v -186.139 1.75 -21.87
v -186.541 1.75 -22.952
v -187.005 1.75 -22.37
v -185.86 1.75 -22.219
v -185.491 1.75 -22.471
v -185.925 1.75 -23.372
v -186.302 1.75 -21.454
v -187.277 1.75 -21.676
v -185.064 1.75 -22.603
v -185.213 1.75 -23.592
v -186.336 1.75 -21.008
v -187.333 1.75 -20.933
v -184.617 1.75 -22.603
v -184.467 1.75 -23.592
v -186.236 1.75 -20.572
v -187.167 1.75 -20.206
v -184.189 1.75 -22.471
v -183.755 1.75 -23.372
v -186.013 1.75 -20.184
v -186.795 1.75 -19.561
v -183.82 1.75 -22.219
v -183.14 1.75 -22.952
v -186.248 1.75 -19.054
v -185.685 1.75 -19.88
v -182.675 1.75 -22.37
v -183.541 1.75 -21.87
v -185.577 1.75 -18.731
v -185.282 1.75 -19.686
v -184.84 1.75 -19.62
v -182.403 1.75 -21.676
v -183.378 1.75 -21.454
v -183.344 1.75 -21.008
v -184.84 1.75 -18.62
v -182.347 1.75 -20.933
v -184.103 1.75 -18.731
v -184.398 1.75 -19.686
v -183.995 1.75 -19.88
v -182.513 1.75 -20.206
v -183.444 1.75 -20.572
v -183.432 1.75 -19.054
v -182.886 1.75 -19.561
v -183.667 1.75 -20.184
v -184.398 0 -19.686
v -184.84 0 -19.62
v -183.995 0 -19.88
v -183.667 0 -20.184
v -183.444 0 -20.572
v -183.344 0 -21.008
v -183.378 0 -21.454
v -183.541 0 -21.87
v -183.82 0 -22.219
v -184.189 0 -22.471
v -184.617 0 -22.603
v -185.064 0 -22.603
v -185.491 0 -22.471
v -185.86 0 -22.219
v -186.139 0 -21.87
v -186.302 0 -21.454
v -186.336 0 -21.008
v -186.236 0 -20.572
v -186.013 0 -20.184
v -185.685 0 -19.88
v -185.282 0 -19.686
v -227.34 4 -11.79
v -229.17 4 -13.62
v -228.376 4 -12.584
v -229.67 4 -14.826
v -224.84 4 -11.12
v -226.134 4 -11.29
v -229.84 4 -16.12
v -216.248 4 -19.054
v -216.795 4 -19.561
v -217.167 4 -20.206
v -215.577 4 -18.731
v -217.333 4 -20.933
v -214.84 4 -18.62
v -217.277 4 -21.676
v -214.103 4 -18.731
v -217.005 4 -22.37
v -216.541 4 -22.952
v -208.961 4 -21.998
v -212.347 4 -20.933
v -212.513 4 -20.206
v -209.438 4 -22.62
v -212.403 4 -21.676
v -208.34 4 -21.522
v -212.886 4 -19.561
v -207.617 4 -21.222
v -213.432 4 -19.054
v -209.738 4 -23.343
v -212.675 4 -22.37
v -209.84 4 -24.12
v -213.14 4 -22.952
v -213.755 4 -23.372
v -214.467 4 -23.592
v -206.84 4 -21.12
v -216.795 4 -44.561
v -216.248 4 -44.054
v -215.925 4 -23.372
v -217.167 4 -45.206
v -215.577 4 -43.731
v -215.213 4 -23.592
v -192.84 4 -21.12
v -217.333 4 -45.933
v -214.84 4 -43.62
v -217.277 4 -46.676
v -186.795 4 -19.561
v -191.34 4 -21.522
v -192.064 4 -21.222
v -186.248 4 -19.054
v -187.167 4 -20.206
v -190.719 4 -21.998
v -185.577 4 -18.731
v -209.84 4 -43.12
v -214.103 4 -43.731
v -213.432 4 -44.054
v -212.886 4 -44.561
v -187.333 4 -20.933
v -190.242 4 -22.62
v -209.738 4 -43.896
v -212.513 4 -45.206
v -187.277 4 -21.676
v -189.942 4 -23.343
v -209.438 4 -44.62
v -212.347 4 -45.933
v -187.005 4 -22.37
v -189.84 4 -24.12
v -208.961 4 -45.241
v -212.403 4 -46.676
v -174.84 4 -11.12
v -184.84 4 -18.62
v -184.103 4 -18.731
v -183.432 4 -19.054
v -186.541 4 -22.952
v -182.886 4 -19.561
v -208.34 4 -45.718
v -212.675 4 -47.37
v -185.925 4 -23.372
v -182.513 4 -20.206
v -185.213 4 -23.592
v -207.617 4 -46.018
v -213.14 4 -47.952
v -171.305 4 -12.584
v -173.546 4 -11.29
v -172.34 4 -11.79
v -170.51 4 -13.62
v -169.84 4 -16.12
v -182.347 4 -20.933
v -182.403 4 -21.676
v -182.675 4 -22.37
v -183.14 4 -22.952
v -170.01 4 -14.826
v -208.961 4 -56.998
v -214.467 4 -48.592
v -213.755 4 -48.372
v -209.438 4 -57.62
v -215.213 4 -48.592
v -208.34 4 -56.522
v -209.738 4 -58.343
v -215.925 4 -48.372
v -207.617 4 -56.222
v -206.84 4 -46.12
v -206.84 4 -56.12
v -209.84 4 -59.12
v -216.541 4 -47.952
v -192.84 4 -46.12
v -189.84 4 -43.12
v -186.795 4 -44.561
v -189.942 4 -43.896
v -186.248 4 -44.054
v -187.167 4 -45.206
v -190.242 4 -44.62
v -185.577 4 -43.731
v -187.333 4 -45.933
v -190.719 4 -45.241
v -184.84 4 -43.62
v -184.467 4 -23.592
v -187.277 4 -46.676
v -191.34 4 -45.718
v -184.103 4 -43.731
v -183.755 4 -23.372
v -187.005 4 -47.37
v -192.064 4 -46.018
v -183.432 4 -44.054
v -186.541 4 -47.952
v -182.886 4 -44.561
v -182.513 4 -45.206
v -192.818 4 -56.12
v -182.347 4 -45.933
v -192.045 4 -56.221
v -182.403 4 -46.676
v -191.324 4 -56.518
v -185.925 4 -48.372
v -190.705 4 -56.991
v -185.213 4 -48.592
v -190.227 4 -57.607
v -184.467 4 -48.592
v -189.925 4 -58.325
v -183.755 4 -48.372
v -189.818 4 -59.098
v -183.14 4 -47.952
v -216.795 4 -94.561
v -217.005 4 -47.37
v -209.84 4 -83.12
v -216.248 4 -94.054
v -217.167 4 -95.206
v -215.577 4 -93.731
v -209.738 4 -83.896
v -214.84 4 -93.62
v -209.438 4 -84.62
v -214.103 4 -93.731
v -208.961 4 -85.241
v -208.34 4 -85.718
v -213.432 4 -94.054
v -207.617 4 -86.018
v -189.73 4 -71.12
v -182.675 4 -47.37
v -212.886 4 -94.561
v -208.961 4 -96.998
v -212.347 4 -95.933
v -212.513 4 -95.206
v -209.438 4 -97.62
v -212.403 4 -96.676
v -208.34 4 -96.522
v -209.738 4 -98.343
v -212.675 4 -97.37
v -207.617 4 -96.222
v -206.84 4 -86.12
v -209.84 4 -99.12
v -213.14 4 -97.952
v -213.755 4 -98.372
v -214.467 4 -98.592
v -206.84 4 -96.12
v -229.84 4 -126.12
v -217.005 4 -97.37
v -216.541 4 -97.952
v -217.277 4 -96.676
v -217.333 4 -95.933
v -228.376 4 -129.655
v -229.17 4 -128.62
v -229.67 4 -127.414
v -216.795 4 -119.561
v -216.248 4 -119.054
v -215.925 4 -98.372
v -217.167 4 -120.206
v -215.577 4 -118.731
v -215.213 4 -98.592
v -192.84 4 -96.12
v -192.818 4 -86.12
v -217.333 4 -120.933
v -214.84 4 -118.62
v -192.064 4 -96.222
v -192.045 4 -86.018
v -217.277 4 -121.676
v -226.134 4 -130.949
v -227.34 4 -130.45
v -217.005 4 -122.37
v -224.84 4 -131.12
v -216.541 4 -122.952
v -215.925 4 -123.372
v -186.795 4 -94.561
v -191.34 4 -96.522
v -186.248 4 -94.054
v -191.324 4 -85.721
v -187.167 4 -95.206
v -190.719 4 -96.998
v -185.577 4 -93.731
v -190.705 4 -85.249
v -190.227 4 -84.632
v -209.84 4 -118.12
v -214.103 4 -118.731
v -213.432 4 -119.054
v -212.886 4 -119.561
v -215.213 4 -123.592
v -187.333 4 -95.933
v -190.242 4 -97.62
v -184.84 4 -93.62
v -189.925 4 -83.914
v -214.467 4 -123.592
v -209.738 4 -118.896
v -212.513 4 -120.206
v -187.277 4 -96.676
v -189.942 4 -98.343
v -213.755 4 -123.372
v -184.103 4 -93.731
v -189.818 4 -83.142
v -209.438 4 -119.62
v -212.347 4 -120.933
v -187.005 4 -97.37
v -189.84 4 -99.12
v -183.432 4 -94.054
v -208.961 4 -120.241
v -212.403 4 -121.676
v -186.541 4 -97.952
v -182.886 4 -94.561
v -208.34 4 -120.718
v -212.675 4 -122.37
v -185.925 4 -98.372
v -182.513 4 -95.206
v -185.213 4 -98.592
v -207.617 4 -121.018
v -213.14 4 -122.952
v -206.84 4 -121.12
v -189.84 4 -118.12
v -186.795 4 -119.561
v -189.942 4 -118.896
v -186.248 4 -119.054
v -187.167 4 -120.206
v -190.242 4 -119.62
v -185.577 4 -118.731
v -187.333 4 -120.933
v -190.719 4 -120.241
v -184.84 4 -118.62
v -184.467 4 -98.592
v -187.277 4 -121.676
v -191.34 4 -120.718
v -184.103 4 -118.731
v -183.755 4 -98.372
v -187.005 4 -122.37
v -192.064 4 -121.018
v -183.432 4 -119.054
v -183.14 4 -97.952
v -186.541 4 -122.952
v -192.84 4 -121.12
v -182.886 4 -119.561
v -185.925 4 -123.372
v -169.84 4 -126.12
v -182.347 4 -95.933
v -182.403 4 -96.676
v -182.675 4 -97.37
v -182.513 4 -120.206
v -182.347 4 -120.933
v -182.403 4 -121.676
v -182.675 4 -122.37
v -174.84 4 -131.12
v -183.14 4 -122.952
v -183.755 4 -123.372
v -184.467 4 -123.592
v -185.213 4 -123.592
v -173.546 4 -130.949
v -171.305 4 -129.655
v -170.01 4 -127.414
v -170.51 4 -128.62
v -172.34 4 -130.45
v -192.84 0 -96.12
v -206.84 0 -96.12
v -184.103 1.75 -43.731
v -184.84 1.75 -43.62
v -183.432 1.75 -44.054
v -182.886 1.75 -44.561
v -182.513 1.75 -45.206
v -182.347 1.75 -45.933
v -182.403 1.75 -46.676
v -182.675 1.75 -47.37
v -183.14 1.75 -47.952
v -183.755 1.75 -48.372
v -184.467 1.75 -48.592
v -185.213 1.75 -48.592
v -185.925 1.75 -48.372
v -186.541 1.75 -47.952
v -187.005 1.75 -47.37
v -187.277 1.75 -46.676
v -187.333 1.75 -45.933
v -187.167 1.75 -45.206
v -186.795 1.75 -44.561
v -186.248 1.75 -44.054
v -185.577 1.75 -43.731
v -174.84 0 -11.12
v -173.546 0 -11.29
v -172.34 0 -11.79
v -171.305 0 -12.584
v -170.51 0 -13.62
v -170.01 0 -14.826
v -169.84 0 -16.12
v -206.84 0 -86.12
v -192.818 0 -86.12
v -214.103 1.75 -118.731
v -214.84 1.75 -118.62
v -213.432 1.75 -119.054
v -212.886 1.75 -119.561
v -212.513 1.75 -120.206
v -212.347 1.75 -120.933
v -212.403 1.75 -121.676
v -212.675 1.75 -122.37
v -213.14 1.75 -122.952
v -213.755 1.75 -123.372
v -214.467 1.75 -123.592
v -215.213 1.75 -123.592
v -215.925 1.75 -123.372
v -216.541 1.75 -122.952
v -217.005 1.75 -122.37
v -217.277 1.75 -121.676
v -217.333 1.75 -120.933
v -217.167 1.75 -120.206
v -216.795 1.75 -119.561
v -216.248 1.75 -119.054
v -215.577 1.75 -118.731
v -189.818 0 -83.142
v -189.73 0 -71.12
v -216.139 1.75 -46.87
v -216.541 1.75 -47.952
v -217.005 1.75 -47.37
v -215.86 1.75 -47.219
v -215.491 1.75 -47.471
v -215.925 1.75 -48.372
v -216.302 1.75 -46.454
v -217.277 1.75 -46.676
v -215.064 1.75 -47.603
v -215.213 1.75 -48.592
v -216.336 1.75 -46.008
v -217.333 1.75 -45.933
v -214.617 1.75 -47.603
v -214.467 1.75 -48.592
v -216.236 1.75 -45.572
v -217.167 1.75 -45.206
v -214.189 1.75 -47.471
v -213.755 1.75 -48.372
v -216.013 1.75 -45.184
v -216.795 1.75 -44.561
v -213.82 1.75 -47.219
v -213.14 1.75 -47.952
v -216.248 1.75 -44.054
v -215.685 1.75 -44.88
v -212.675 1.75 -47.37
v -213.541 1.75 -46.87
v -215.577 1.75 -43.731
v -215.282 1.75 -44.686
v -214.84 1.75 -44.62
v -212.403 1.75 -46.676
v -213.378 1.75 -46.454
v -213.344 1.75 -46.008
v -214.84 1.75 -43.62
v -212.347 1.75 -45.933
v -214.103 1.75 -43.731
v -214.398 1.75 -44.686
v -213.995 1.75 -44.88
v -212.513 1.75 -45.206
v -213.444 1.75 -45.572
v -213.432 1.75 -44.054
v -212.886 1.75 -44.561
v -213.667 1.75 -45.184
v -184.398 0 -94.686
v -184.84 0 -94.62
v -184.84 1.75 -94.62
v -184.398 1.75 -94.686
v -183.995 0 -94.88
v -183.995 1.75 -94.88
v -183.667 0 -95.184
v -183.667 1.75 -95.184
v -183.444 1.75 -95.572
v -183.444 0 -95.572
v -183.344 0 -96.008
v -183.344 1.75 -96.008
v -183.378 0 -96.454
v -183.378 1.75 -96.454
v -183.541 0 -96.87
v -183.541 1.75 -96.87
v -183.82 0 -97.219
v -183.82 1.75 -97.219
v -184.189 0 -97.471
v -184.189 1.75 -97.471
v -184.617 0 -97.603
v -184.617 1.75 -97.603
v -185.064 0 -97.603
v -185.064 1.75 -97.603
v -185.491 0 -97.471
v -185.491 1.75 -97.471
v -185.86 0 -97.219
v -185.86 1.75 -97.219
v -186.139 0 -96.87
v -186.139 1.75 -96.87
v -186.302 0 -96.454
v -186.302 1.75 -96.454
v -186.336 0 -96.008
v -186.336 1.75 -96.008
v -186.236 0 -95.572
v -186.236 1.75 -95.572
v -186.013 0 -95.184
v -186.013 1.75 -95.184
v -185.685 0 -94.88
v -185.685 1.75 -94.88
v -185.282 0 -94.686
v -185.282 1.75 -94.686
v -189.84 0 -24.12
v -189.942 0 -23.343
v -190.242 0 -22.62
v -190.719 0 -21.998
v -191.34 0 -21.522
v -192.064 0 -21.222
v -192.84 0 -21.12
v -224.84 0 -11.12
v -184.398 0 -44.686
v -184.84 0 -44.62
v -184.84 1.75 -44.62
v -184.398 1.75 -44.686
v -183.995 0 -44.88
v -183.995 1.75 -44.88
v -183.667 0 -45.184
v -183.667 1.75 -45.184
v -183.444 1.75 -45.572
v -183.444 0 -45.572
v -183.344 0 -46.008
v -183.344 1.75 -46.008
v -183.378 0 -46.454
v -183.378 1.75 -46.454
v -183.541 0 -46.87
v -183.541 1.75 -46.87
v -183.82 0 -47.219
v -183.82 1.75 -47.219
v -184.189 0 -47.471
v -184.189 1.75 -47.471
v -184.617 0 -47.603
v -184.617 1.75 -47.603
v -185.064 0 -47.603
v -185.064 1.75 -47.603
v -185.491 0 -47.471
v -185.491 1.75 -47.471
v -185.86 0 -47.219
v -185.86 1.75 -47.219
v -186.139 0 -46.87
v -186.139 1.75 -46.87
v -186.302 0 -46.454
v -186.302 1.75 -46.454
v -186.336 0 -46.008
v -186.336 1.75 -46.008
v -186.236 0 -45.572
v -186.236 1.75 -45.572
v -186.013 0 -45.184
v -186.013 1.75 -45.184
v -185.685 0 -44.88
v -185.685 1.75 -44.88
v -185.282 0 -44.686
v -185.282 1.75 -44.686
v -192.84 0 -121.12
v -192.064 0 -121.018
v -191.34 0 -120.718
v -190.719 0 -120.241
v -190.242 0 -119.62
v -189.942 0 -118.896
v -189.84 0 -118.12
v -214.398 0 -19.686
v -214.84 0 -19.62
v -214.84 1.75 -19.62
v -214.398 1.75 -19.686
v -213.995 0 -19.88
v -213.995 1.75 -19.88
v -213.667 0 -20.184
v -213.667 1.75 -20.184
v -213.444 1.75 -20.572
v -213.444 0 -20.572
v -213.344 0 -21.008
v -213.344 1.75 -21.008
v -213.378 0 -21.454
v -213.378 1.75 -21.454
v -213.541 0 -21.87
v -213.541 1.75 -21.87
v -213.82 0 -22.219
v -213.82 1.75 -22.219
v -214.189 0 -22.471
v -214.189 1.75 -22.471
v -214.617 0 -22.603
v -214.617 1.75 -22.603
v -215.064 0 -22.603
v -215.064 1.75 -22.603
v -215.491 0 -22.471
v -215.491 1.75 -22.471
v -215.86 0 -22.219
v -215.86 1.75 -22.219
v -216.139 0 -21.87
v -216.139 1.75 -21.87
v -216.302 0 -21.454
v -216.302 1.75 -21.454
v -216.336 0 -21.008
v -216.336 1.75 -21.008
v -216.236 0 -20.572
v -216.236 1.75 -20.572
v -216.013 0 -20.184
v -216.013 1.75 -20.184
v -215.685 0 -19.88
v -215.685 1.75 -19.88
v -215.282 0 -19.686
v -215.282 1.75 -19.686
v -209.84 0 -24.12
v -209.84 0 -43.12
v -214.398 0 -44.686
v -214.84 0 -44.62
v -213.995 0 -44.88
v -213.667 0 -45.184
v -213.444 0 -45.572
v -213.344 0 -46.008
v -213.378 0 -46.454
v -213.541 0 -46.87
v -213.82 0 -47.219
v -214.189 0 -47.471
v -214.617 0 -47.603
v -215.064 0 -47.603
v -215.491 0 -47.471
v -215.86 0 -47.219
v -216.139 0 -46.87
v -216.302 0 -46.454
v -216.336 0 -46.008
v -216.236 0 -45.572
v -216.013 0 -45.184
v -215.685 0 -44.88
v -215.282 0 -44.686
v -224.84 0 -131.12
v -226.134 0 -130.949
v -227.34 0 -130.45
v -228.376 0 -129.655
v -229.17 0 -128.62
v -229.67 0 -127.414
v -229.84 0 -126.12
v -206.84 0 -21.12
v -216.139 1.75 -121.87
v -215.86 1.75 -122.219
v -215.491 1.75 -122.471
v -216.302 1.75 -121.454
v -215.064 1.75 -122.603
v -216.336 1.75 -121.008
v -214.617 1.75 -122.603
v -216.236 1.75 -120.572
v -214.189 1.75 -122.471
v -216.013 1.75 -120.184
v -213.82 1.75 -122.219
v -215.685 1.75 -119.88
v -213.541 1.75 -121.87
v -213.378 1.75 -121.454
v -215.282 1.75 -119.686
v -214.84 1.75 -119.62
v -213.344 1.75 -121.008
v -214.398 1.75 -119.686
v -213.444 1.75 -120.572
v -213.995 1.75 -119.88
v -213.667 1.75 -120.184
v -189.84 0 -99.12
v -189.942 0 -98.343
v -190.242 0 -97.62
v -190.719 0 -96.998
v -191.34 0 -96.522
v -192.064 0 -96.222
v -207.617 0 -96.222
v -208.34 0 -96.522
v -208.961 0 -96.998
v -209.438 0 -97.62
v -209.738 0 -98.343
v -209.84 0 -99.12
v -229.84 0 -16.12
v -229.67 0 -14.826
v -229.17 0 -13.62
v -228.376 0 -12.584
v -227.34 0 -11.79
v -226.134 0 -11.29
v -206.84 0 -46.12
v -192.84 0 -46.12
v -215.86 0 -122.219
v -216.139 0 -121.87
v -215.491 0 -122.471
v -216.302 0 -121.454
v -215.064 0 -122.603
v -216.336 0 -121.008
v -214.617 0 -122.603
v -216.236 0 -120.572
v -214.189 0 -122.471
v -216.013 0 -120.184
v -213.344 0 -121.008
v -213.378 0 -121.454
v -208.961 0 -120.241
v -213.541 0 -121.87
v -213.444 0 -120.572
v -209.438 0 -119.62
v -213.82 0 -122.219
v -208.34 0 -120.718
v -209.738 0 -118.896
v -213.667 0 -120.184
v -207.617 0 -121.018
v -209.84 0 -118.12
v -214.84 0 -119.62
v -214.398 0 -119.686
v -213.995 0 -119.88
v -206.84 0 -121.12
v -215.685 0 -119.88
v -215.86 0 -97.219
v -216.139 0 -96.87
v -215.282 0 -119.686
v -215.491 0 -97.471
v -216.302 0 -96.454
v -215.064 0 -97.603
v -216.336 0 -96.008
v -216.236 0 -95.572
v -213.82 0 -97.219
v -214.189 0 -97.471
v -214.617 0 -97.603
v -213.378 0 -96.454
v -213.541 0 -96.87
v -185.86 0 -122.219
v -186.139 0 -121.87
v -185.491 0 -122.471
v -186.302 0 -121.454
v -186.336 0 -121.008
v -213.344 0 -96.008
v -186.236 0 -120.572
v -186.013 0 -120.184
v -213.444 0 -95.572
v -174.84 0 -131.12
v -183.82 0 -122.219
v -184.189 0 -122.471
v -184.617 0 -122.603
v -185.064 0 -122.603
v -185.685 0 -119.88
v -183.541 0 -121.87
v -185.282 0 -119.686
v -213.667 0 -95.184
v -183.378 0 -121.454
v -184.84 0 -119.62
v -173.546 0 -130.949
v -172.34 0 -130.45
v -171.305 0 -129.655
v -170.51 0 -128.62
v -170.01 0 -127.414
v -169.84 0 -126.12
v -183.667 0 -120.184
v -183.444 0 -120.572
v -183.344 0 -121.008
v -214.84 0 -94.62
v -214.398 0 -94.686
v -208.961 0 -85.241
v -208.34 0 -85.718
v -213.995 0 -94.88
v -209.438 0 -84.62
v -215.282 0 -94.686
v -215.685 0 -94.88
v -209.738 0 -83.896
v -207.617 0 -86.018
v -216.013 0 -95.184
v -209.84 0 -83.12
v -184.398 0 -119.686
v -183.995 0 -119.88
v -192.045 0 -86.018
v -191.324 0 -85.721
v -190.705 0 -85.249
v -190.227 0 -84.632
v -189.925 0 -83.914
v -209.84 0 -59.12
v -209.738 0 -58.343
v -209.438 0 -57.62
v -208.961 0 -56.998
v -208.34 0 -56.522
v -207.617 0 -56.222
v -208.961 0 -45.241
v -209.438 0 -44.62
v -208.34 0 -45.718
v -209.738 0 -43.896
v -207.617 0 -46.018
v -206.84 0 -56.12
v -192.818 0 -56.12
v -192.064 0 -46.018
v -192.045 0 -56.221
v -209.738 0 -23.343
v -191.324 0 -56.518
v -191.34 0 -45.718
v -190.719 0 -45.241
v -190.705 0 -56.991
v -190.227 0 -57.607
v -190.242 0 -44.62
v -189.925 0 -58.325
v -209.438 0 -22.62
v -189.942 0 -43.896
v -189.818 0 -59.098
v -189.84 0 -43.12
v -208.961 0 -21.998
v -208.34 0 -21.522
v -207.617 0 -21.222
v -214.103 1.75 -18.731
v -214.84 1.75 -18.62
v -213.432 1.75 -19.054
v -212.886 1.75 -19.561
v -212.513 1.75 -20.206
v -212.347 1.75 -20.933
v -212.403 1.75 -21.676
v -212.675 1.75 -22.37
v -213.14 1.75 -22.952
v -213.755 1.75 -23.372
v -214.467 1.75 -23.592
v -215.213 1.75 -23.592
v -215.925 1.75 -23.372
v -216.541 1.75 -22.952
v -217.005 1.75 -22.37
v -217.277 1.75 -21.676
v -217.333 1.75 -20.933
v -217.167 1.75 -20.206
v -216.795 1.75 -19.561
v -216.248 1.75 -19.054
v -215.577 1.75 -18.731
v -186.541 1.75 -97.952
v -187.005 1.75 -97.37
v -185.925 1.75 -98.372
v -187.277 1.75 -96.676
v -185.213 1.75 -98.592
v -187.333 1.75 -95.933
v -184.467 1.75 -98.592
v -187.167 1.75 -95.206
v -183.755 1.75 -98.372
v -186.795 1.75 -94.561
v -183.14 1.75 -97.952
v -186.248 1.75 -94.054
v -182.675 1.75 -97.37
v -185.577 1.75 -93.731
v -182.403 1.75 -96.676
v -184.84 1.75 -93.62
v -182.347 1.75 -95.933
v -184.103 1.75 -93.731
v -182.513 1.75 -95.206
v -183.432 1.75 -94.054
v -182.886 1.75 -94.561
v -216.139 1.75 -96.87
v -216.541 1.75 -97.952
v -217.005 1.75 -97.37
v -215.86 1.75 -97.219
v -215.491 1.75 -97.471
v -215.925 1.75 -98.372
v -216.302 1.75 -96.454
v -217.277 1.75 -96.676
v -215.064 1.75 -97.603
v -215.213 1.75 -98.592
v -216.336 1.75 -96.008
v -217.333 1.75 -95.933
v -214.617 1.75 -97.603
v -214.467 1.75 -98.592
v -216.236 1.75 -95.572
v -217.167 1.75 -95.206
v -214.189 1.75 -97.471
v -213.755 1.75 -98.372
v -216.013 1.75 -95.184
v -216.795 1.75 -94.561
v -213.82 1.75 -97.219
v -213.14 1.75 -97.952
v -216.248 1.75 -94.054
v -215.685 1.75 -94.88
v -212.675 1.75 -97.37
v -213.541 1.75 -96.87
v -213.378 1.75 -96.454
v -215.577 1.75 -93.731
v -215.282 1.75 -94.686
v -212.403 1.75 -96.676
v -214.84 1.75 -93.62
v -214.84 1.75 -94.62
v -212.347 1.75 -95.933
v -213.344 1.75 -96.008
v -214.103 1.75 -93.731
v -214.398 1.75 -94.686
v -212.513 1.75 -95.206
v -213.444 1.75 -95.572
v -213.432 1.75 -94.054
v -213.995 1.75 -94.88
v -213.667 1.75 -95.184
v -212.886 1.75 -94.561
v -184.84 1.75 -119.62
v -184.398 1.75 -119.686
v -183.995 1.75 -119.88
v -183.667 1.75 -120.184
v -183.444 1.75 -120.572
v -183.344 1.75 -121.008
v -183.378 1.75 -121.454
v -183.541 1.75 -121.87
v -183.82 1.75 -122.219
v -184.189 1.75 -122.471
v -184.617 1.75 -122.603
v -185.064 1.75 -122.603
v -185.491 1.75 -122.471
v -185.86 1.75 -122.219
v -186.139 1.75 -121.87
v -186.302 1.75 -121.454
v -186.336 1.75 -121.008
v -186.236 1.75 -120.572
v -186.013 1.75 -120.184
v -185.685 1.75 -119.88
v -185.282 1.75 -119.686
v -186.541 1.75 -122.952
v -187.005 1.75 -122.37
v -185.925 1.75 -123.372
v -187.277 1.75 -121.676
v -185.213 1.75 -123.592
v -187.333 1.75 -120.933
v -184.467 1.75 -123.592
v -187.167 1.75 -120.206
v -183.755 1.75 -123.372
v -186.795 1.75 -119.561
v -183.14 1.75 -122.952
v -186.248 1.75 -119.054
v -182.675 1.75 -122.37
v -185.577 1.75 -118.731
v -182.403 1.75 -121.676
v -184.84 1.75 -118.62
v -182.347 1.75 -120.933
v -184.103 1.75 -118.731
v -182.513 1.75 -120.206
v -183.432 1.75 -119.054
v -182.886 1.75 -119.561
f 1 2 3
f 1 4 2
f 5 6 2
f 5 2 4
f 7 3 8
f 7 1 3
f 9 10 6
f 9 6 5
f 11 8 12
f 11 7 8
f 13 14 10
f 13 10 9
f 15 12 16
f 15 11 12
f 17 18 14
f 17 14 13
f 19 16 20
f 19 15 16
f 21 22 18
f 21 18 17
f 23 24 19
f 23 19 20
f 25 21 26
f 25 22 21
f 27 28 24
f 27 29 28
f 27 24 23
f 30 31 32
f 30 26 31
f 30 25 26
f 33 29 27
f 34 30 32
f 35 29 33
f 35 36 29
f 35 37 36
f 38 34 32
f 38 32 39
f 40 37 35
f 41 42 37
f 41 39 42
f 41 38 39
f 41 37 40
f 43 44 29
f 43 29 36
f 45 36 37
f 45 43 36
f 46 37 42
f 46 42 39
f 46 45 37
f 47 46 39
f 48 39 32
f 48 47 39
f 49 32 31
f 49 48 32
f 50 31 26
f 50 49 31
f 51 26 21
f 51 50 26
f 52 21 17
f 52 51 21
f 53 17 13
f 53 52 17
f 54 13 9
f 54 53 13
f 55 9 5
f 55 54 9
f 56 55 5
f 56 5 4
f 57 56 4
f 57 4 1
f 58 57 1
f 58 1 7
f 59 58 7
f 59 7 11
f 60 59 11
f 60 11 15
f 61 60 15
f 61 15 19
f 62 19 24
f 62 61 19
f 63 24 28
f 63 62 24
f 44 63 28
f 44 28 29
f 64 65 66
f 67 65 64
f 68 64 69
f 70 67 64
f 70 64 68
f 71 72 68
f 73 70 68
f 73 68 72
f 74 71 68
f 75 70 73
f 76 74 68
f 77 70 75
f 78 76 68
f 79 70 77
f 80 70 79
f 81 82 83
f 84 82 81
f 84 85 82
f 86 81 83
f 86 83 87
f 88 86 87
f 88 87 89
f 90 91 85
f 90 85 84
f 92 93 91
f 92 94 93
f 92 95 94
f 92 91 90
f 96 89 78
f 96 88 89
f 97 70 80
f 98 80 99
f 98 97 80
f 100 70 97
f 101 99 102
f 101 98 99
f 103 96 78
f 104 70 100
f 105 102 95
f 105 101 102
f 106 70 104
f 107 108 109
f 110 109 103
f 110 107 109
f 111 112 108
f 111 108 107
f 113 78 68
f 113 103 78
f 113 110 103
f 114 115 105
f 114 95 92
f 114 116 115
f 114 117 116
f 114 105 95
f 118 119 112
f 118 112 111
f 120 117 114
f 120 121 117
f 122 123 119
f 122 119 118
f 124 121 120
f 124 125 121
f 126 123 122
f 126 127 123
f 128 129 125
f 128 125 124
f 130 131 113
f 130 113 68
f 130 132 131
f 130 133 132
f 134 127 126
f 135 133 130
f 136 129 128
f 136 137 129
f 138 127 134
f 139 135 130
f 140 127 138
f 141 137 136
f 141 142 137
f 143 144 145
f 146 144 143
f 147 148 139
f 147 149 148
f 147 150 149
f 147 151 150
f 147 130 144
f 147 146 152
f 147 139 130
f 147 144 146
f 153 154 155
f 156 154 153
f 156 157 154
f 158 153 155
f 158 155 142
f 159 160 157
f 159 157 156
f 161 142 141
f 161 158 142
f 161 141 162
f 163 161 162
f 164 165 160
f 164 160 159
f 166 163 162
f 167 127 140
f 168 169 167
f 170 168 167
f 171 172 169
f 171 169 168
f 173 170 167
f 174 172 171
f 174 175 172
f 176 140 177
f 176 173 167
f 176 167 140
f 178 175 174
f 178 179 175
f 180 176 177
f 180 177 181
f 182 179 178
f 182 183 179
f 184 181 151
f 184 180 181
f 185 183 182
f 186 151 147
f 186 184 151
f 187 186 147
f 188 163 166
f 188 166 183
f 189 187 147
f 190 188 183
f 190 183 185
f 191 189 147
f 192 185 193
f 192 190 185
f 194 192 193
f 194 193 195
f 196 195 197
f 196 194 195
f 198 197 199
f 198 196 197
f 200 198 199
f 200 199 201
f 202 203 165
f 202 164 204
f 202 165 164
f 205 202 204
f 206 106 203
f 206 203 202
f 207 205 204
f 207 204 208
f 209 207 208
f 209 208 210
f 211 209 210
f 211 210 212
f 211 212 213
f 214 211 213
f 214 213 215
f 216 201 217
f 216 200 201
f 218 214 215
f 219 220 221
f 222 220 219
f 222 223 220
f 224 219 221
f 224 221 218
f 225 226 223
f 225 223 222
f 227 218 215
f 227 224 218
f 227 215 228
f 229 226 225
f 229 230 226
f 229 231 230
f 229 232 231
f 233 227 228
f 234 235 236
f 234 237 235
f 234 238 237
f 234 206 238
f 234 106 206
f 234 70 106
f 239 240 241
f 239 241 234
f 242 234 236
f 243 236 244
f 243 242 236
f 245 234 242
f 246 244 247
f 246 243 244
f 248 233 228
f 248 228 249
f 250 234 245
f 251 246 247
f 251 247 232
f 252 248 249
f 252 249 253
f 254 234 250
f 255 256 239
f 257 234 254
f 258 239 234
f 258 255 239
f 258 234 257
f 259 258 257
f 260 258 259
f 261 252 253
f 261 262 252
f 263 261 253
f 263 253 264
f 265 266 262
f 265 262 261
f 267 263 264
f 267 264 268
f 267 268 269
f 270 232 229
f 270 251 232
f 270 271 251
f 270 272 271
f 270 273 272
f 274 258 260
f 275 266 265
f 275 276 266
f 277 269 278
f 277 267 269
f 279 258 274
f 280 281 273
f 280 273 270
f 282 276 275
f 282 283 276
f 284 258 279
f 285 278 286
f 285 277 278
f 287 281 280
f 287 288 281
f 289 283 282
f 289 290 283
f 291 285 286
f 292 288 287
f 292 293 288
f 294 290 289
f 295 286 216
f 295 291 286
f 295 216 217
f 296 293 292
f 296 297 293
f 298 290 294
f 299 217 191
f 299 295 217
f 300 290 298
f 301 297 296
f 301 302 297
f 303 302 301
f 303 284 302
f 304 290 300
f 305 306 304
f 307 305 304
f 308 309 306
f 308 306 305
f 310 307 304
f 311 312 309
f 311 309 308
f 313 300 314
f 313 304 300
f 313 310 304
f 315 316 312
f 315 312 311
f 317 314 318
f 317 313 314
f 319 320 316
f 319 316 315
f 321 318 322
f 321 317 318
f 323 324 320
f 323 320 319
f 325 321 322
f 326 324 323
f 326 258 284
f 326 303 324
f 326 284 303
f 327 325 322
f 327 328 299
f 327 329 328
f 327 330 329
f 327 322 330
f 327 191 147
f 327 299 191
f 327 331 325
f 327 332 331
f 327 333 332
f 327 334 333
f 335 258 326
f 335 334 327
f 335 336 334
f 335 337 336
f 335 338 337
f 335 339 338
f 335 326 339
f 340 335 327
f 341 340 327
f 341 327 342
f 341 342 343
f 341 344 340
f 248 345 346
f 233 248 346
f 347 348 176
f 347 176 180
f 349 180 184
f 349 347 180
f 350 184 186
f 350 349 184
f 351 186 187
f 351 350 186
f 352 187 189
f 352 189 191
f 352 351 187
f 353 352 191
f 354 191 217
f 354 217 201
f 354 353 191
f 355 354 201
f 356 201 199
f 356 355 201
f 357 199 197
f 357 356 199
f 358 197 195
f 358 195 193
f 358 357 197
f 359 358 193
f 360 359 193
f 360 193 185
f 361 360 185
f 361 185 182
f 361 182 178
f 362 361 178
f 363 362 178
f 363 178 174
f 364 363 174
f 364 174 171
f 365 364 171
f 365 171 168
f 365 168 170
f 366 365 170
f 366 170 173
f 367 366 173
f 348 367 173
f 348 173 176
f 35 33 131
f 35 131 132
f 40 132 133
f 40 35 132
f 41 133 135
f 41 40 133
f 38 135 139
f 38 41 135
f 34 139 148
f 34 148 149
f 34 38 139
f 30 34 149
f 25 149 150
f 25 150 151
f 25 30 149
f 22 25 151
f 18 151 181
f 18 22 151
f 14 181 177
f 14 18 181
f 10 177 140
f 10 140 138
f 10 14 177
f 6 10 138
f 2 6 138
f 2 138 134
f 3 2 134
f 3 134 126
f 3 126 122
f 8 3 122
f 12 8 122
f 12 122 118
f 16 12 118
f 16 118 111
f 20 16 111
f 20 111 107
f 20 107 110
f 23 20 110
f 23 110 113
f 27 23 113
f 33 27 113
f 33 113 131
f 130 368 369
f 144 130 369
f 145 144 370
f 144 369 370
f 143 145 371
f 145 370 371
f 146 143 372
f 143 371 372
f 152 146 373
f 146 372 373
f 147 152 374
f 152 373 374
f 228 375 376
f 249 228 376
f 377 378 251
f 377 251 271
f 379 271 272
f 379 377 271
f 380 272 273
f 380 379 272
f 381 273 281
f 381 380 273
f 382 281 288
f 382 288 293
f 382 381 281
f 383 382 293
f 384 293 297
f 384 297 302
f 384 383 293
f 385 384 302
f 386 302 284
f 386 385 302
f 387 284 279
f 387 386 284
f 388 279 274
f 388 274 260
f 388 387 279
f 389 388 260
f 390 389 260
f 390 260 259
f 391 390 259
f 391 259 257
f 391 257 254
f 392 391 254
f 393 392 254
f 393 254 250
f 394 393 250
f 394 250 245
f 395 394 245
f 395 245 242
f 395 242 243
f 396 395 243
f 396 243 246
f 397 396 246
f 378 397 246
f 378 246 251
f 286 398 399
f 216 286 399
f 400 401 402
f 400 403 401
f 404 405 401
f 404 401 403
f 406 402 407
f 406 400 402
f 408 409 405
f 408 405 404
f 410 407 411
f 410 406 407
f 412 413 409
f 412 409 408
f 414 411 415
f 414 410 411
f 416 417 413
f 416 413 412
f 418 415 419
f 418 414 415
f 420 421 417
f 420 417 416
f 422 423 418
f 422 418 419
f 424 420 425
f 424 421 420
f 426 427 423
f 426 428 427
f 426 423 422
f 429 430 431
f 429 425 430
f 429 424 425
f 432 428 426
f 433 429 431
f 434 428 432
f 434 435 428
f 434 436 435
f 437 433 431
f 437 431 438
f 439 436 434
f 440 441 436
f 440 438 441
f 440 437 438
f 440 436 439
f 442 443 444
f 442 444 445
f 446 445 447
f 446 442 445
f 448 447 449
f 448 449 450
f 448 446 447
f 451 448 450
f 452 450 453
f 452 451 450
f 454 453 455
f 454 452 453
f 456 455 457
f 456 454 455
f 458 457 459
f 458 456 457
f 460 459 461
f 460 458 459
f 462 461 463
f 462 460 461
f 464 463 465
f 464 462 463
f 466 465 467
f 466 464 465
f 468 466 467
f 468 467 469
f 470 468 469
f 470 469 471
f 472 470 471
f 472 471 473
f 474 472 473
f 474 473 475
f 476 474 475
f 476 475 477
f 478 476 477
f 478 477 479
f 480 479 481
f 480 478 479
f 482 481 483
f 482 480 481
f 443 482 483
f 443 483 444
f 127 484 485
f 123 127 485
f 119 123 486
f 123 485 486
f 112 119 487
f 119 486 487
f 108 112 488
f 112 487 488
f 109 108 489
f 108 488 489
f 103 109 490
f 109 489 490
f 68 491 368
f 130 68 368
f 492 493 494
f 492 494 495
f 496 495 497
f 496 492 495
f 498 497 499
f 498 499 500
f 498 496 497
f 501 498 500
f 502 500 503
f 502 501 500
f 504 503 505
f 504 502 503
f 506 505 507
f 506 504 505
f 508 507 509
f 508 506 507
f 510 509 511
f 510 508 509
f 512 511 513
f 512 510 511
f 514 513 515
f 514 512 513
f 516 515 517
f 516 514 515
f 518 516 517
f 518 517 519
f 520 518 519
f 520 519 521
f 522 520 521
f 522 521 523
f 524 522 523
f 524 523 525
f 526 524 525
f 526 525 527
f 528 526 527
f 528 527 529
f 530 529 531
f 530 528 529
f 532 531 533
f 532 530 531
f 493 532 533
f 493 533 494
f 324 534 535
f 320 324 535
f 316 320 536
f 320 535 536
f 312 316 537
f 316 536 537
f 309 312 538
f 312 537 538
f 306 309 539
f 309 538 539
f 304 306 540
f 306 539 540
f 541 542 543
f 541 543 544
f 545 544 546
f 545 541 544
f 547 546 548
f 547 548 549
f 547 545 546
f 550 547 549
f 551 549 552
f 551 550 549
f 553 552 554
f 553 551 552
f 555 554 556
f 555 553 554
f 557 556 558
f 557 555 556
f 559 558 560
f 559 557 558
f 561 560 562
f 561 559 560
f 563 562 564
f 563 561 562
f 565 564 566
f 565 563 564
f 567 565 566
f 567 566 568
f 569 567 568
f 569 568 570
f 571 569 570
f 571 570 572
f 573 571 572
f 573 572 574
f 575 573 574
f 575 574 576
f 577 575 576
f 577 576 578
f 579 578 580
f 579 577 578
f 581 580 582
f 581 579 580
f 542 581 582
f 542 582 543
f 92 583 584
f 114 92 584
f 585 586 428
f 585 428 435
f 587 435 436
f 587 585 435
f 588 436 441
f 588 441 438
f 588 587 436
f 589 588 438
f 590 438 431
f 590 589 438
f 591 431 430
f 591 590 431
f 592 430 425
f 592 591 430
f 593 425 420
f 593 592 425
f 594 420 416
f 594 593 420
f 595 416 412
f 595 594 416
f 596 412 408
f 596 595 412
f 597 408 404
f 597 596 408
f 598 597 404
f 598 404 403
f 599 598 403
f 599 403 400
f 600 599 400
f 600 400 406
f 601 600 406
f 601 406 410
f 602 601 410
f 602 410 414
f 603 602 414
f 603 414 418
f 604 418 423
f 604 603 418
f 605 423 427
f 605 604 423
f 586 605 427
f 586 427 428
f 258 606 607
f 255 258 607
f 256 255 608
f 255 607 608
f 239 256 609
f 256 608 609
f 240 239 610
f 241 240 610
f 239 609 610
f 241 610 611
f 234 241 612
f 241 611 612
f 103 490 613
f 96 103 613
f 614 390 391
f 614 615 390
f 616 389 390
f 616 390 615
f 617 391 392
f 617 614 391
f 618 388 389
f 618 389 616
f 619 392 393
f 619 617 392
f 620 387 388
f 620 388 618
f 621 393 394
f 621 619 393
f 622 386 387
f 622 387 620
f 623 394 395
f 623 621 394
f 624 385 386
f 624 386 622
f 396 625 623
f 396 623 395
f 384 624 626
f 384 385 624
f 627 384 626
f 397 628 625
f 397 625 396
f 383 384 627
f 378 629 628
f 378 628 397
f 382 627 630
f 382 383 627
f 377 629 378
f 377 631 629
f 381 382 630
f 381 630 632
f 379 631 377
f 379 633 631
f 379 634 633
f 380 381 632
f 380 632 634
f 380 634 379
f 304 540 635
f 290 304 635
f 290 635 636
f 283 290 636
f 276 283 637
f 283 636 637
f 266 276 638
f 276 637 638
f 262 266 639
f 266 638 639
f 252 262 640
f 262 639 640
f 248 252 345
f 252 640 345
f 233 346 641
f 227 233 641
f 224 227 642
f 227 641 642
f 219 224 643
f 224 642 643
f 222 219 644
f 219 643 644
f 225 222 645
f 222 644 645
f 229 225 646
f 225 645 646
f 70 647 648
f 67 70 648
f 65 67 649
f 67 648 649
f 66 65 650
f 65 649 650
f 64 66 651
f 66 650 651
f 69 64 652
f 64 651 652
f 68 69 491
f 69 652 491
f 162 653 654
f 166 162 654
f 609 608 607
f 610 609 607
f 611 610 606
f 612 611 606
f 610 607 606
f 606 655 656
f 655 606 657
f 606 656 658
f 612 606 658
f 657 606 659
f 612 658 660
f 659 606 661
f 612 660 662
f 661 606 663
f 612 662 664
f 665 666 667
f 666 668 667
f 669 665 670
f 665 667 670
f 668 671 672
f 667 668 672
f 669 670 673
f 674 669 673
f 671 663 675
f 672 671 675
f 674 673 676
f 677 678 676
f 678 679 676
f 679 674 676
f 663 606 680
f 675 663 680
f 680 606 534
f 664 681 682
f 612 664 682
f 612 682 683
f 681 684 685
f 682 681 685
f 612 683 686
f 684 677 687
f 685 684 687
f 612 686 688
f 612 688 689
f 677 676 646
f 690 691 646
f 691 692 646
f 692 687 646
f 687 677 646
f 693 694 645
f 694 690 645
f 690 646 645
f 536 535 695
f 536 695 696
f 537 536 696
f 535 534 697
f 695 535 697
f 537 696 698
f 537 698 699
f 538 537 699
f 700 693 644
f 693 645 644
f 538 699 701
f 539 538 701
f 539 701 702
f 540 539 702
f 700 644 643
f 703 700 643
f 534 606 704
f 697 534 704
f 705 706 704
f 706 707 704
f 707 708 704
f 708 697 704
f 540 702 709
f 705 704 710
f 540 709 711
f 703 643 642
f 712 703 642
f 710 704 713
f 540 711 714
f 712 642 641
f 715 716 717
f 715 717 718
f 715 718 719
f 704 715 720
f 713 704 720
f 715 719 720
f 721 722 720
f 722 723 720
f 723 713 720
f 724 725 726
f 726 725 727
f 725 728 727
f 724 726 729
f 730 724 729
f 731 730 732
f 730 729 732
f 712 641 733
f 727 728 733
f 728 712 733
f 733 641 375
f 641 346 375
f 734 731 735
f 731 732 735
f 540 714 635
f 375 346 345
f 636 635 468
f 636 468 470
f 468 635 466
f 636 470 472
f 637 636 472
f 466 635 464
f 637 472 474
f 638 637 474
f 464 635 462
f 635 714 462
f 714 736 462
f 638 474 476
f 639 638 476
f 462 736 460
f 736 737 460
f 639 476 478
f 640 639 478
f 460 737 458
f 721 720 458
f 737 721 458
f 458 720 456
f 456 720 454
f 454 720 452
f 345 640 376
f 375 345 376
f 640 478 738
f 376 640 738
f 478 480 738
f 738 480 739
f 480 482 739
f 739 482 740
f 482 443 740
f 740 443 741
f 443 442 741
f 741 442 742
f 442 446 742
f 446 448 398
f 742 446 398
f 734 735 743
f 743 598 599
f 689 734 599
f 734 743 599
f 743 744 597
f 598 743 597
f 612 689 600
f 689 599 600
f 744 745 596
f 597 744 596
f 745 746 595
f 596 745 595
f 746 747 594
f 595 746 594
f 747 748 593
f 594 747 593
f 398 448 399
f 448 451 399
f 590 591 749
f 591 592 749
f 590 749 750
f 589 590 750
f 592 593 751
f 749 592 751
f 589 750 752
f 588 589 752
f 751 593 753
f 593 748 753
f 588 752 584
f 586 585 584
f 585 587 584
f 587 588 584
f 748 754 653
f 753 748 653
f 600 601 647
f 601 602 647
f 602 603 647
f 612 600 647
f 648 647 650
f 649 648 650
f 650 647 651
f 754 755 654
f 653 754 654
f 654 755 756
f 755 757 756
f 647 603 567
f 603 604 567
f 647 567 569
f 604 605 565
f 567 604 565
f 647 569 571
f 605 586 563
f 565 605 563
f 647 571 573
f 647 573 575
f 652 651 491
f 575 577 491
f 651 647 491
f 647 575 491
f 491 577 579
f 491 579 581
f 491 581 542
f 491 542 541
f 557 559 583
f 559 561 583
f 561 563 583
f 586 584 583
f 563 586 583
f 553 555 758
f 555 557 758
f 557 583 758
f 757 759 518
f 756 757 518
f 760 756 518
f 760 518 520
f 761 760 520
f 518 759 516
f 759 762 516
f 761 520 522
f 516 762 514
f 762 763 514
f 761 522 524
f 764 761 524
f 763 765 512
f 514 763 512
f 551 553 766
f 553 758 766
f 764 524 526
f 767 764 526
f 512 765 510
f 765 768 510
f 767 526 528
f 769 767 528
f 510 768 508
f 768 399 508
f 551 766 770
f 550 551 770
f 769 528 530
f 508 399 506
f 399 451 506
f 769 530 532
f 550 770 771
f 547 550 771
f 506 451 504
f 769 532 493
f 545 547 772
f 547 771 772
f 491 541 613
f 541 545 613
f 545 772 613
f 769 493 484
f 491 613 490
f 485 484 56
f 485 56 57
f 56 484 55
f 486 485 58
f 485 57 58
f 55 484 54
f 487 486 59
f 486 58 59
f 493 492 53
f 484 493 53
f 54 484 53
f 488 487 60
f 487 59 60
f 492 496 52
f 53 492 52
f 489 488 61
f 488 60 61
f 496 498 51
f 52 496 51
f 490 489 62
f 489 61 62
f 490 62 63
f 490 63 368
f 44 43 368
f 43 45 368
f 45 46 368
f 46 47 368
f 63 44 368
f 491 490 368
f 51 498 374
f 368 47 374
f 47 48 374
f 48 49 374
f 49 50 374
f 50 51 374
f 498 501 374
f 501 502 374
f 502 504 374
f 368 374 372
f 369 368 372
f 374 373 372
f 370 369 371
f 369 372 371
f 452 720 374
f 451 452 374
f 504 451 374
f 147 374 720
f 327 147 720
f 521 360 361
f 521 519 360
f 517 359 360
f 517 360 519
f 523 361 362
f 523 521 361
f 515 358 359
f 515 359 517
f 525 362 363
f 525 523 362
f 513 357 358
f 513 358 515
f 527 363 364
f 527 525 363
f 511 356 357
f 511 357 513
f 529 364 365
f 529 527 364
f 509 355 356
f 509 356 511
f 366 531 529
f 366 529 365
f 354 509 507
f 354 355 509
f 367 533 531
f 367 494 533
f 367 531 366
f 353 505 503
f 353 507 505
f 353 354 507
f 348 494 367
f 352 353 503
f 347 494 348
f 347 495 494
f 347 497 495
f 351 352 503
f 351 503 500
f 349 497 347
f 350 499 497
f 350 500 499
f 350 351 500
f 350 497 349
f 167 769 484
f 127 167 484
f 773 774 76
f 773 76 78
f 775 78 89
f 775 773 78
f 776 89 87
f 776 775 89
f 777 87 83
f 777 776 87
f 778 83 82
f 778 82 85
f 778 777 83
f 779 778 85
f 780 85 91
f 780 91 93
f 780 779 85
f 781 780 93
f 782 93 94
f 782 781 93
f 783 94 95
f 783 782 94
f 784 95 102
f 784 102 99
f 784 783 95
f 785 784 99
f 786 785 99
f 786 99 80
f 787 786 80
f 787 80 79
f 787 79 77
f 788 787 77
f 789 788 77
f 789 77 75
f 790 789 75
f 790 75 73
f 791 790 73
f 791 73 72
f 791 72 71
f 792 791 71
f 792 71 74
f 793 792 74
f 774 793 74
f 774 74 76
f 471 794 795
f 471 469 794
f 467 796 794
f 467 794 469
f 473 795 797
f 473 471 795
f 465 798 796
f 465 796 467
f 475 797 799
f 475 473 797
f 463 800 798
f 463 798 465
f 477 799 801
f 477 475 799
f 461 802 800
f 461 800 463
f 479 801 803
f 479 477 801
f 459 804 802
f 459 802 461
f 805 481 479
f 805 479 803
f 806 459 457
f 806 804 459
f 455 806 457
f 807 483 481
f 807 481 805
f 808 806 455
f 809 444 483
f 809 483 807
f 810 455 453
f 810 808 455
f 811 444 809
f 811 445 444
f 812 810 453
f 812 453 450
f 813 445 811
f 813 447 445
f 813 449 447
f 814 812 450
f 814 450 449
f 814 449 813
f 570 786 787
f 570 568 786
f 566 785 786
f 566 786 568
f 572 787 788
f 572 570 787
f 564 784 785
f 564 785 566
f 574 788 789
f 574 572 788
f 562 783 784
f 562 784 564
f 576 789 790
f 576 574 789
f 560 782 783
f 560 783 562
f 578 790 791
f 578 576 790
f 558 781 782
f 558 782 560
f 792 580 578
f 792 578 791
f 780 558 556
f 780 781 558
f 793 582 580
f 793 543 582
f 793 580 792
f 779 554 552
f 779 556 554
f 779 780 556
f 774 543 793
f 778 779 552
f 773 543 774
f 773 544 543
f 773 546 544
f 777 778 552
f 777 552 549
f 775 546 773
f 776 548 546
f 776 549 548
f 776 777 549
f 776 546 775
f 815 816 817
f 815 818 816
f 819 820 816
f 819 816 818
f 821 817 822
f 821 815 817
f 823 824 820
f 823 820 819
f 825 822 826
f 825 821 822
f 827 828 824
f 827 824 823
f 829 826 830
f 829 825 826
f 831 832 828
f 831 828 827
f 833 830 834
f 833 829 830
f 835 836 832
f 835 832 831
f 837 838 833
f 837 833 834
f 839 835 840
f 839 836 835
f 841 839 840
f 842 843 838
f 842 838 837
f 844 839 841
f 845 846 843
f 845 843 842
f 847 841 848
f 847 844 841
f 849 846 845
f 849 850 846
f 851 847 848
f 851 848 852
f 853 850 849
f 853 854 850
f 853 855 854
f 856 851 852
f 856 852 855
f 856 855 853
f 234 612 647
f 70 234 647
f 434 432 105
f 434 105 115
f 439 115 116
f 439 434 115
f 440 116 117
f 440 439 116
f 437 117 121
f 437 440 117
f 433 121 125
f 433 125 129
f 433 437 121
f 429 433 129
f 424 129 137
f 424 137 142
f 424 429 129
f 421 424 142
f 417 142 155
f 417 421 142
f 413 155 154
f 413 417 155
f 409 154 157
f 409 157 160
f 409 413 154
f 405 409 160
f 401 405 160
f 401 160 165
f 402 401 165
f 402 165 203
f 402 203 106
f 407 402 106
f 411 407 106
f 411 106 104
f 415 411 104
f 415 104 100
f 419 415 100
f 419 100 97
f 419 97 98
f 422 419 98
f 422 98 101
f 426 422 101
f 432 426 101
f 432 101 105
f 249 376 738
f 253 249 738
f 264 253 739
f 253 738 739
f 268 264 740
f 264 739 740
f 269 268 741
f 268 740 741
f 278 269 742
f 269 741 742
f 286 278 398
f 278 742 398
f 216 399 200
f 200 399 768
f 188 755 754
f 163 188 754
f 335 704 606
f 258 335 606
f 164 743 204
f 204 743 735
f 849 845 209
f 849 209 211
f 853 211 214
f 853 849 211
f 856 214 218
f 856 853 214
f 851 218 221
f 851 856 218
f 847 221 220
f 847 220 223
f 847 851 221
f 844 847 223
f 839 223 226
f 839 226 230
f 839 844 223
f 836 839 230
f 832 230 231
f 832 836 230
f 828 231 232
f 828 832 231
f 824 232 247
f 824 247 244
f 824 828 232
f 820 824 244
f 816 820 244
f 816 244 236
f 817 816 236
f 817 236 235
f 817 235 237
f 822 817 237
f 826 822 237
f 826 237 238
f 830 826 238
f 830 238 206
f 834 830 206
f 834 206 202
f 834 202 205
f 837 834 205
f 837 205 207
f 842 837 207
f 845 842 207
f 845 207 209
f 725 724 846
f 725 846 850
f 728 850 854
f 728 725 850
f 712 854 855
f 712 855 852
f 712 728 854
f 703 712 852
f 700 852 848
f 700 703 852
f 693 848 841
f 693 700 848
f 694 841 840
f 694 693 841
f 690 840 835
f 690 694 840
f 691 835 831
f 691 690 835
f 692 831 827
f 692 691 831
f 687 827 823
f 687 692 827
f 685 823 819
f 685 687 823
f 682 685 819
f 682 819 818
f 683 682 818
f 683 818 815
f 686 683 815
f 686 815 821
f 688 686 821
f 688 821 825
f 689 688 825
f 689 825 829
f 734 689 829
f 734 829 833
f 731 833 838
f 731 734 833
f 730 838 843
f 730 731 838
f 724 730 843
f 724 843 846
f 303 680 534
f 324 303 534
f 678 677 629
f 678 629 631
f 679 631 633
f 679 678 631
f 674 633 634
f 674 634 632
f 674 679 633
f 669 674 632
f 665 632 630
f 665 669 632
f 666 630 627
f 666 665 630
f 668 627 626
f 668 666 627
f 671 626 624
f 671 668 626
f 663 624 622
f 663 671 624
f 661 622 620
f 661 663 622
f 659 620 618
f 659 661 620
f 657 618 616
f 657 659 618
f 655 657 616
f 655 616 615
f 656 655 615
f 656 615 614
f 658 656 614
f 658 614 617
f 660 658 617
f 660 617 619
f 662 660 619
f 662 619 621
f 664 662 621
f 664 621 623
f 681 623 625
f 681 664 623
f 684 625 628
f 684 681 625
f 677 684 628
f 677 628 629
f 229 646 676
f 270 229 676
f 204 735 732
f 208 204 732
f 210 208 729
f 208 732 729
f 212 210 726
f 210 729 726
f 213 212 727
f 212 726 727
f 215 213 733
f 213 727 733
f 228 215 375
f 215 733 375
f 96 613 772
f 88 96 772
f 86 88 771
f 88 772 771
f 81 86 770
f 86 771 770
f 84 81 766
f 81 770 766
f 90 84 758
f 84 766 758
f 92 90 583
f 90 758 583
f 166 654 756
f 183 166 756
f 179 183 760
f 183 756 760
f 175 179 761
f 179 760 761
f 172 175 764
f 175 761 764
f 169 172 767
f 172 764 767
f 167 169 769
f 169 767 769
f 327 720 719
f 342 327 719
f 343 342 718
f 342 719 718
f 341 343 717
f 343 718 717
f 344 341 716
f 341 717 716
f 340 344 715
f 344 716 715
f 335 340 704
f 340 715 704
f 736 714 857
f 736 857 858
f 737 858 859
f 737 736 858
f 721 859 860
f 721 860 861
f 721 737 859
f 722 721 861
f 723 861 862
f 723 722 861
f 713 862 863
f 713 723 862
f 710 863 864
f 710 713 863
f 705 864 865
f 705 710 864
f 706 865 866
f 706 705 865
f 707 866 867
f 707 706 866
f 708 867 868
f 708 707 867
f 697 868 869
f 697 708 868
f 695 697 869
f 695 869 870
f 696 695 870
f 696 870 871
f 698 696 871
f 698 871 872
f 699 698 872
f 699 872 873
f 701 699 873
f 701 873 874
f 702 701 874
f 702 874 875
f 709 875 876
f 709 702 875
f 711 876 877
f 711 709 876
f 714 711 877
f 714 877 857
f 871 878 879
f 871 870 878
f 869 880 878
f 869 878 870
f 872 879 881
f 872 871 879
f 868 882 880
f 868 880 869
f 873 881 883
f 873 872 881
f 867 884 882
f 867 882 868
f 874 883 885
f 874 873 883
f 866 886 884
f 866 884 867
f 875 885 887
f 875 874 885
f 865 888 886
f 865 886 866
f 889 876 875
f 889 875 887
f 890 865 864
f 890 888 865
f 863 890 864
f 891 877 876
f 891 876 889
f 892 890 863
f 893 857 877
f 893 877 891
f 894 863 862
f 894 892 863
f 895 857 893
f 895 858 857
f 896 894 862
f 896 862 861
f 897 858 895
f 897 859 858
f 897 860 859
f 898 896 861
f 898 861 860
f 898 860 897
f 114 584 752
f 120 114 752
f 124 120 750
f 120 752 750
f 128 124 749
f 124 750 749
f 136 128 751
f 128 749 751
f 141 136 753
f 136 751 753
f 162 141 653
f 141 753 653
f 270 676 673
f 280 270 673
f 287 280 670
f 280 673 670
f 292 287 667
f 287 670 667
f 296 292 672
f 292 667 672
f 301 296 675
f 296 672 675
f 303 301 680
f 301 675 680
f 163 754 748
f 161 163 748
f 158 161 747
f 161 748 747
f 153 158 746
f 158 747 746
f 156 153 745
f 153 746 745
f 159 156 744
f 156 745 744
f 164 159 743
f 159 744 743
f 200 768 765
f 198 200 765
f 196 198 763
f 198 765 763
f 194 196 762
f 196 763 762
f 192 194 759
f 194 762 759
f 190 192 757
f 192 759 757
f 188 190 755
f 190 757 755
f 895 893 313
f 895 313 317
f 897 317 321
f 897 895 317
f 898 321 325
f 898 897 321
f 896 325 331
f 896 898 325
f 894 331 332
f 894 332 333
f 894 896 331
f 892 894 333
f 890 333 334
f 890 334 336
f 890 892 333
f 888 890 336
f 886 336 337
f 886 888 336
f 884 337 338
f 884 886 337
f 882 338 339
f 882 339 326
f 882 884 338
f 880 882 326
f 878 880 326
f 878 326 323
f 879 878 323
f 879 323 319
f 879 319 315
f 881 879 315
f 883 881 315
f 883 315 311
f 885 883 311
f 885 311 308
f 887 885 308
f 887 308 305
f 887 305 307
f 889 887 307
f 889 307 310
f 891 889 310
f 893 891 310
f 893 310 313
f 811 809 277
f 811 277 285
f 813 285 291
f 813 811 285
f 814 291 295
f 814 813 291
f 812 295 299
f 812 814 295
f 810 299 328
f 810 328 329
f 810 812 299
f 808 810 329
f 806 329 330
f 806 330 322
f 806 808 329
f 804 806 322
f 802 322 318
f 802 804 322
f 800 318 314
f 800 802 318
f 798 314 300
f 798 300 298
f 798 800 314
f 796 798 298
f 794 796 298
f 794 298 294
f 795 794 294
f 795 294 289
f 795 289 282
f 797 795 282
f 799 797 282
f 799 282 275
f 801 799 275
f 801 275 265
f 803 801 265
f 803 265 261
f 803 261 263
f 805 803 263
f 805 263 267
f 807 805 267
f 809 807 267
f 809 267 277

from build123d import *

# Parameters (mm, degrees)
SKETCH_1_R      = 2.5
EXTRUDE_1_DEPTH = 4
SKETCH_1_32_R   = 2.5
SKETCH_1_32_R_2 = 1.5
EXTRUDE_2_DEPTH = 1.75
SKETCH_1_33_R   = 2.5
SKETCH_1_33_R_2 = 1.5
EXTRUDE_3_DEPTH = 1.75


with BuildPart() as part:
    # 草图1 → 凸台-拉伸1 (new body)
    with BuildSketch(Plane(origin=(0, 0, 0), x_dir=(1, 0, 0), z_dir=(0, 1, 0))):
        with BuildLine():
            Line((-174.840079727, 131.119726246), (-199.840079727, 131.119726246))
            Line((-199.840079727, 131.119726246), (-224.840079727, 131.119726246))
            ThreePointArc((-224.840079727, 131.119726246), (-228.375613633, 129.655260152), (-229.840079727, 126.119726246))
            Line((-229.840079727, 126.119726246), (-229.840079727, 16.119726246))
            ThreePointArc((-229.840079727, 16.119726246), (-228.375613633, 12.58419234), (-224.840079727, 11.119726246))
            Line((-224.840079727, 11.119726246), (-199.840079727, 11.119726246))
            Line((-199.840079727, 11.119726246), (-174.840079727, 11.119726246))
            ThreePointArc((-174.840079727, 11.119726246), (-171.304545821, 12.58419234), (-169.840079727, 16.119726246))
            Line((-169.840079727, 16.119726246), (-169.840079727, 126.119726246))
            ThreePointArc((-169.840079727, 126.119726246), (-171.304545821, 129.655260152), (-174.840079727, 131.119726246))
        make_face()
        with Locations((-214.840082087, 21.119726246)):
            Circle(SKETCH_1_R, mode=Mode.SUBTRACT)
        with BuildLine():
            ThreePointArc((-192.840079727, 46.119726246), (-190.718759384, 45.241046589), (-189.840079727, 43.119726246))
            Line((-189.840079727, 43.119726246), (-189.840079727, 24.119726246))
            ThreePointArc((-189.840079727, 24.119726246), (-190.718759384, 21.998405902), (-192.840079727, 21.119726246))
            Line((-192.840079727, 21.119726246), (-206.840082087, 21.119726246))
            ThreePointArc((-206.840082087, 21.119726246), (-208.961402431, 21.998405902), (-209.840082087, 24.119726246))
            Line((-209.840082087, 24.119726246), (-209.840082087, 43.119726246))
            ThreePointArc((-209.840082087, 43.119726246), (-208.961402431, 45.241046589), (-206.840082087, 46.119726246))
            Line((-206.840082087, 46.119726246), (-192.840079727, 46.119726246))
        make_face(mode=Mode.SUBTRACT)
        with Locations((-214.840082087, 46.119726246)):
            Circle(SKETCH_1_R, mode=Mode.SUBTRACT)
        with Locations((-184.840079727, 21.119726246)):
            Circle(SKETCH_1_R, mode=Mode.SUBTRACT)
        with BuildLine():
            ThreePointArc((-206.840082087, 56.119726246), (-208.961402431, 56.998405902), (-209.840082087, 59.119726246))
            Line((-209.840082087, 59.119726246), (-209.840082087, 83.119726246))
            ThreePointArc((-209.840082087, 83.119726246), (-208.961402431, 85.241046589), (-206.840082087, 86.119726246))
            Line((-206.840082087, 86.119726246), (-192.818063372, 86.119726246))
            ThreePointArc((-192.818063372, 86.119726246), (-190.704569987, 85.248844775), (-189.818144754, 83.141823385))
            Line((-189.818144754, 83.141823385), (-189.729591033, 71.119726246))
            Line((-189.729591033, 71.119726246), (-189.818144754, 59.097629106))
            ThreePointArc((-189.818144754, 59.097629106), (-190.704569987, 56.990607717), (-192.818063372, 56.119726246))
            Line((-192.818063372, 56.119726246), (-206.840082087, 56.119726246))
        make_face(mode=Mode.SUBTRACT)
        with Locations((-184.840079727, 46.119726246)):
            Circle(SKETCH_1_R, mode=Mode.SUBTRACT)
        with Locations((-214.840082087, 96.119726246)):
            Circle(SKETCH_1_R, mode=Mode.SUBTRACT)
        with Locations((-214.840082087, 121.119726246)):
            Circle(SKETCH_1_R, mode=Mode.SUBTRACT)
        with BuildLine():
            Line((-192.840079727, 96.119726246), (-206.840082087, 96.119726246))
            ThreePointArc((-206.840082087, 96.119726246), (-208.961402431, 96.998405902), (-209.840082087, 99.119726246))
            Line((-209.840082087, 99.119726246), (-209.840082087, 118.119726246))
            ThreePointArc((-209.840082087, 118.119726246), (-208.961402431, 120.241046589), (-206.840082087, 121.119726246))
            Line((-206.840082087, 121.119726246), (-192.840079727, 121.119726246))
            ThreePointArc((-192.840079727, 121.119726246), (-190.718759384, 120.241046589), (-189.840079727, 118.119726246))
            Line((-189.840079727, 118.119726246), (-189.840079727, 99.119726246))
            ThreePointArc((-189.840079727, 99.119726246), (-190.718759384, 96.998405902), (-192.840079727, 96.119726246))
        make_face(mode=Mode.SUBTRACT)
        with Locations((-184.840079727, 96.119726246)):
            Circle(SKETCH_1_R, mode=Mode.SUBTRACT)
        with Locations((-184.840079727, 121.119726246)):
            Circle(SKETCH_1_R, mode=Mode.SUBTRACT)
    extrude(amount=EXTRUDE_1_DEPTH)

    # 草图1<32> → 凸台-拉伸2 (add)
    # profile 1 of 4: a face of its own
    with BuildSketch(Plane(origin=(0, 0, 0), x_dir=(1, 0, 0), z_dir=(0, 1, 0))):
        with Locations((-214.840082087, 96.119726246)):
            Circle(SKETCH_1_32_R)
        with Locations((-214.840082087, 96.119726246)):
            Circle(SKETCH_1_32_R_2, mode=Mode.SUBTRACT)
    # profile 2 of 4: a face of its own
    with BuildSketch(Plane(origin=(0, 0, 0), x_dir=(1, 0, 0), z_dir=(0, 1, 0))):
        with Locations((-184.840079727, 96.119726246)):
            Circle(SKETCH_1_32_R)
        with Locations((-184.840079727, 96.119726246)):
            Circle(SKETCH_1_32_R_2, mode=Mode.SUBTRACT)
    # profile 3 of 4: a face of its own
    with BuildSketch(Plane(origin=(0, 0, 0), x_dir=(1, 0, 0), z_dir=(0, 1, 0))):
        with Locations((-184.840079727, 121.119726246)):
            Circle(SKETCH_1_32_R)
        with Locations((-184.840079727, 121.119726246)):
            Circle(SKETCH_1_32_R_2, mode=Mode.SUBTRACT)
    # profile 4 of 4: a face of its own
    with BuildSketch(Plane(origin=(0, 0, 0), x_dir=(1, 0, 0), z_dir=(0, 1, 0))):
        with Locations((-214.840082087, 121.119726246)):
            Circle(SKETCH_1_32_R)
        with Locations((-214.840082087, 121.119726246)):
            Circle(SKETCH_1_32_R_2, mode=Mode.SUBTRACT)
    extrude(amount=EXTRUDE_2_DEPTH)

    # 草图1<33> → 凸台-拉伸3 (add)
    # profile 1 of 4: a face of its own
    with BuildSketch(Plane(origin=(0, 0, 0), x_dir=(1, 0, 0), z_dir=(0, 1, 0))):
        with Locations((-214.840082087, 21.119726246)):
            Circle(SKETCH_1_33_R)
        with Locations((-214.840082087, 21.119726246)):
            Circle(SKETCH_1_33_R_2, mode=Mode.SUBTRACT)
    # profile 2 of 4: a face of its own
    with BuildSketch(Plane(origin=(0, 0, 0), x_dir=(1, 0, 0), z_dir=(0, 1, 0))):
        with Locations((-184.840079727, 21.119726246)):
            Circle(SKETCH_1_33_R)
        with Locations((-184.840079727, 21.119726246)):
            Circle(SKETCH_1_33_R_2, mode=Mode.SUBTRACT)
    # profile 3 of 4: a face of its own
    with BuildSketch(Plane(origin=(0, 0, 0), x_dir=(1, 0, 0), z_dir=(0, 1, 0))):
        with Locations((-184.840079727, 46.119726246)):
            Circle(SKETCH_1_33_R)
        with Locations((-184.840079727, 46.119726246)):
            Circle(SKETCH_1_33_R_2, mode=Mode.SUBTRACT)
    # profile 4 of 4: a face of its own
    with BuildSketch(Plane(origin=(0, 0, 0), x_dir=(1, 0, 0), z_dir=(0, 1, 0))):
        with Locations((-214.840082087, 46.119726246)):
            Circle(SKETCH_1_33_R)
        with Locations((-214.840082087, 46.119726246)):
            Circle(SKETCH_1_33_R_2, mode=Mode.SUBTRACT)
    extrude(amount=EXTRUDE_3_DEPTH)


solid = part.part
